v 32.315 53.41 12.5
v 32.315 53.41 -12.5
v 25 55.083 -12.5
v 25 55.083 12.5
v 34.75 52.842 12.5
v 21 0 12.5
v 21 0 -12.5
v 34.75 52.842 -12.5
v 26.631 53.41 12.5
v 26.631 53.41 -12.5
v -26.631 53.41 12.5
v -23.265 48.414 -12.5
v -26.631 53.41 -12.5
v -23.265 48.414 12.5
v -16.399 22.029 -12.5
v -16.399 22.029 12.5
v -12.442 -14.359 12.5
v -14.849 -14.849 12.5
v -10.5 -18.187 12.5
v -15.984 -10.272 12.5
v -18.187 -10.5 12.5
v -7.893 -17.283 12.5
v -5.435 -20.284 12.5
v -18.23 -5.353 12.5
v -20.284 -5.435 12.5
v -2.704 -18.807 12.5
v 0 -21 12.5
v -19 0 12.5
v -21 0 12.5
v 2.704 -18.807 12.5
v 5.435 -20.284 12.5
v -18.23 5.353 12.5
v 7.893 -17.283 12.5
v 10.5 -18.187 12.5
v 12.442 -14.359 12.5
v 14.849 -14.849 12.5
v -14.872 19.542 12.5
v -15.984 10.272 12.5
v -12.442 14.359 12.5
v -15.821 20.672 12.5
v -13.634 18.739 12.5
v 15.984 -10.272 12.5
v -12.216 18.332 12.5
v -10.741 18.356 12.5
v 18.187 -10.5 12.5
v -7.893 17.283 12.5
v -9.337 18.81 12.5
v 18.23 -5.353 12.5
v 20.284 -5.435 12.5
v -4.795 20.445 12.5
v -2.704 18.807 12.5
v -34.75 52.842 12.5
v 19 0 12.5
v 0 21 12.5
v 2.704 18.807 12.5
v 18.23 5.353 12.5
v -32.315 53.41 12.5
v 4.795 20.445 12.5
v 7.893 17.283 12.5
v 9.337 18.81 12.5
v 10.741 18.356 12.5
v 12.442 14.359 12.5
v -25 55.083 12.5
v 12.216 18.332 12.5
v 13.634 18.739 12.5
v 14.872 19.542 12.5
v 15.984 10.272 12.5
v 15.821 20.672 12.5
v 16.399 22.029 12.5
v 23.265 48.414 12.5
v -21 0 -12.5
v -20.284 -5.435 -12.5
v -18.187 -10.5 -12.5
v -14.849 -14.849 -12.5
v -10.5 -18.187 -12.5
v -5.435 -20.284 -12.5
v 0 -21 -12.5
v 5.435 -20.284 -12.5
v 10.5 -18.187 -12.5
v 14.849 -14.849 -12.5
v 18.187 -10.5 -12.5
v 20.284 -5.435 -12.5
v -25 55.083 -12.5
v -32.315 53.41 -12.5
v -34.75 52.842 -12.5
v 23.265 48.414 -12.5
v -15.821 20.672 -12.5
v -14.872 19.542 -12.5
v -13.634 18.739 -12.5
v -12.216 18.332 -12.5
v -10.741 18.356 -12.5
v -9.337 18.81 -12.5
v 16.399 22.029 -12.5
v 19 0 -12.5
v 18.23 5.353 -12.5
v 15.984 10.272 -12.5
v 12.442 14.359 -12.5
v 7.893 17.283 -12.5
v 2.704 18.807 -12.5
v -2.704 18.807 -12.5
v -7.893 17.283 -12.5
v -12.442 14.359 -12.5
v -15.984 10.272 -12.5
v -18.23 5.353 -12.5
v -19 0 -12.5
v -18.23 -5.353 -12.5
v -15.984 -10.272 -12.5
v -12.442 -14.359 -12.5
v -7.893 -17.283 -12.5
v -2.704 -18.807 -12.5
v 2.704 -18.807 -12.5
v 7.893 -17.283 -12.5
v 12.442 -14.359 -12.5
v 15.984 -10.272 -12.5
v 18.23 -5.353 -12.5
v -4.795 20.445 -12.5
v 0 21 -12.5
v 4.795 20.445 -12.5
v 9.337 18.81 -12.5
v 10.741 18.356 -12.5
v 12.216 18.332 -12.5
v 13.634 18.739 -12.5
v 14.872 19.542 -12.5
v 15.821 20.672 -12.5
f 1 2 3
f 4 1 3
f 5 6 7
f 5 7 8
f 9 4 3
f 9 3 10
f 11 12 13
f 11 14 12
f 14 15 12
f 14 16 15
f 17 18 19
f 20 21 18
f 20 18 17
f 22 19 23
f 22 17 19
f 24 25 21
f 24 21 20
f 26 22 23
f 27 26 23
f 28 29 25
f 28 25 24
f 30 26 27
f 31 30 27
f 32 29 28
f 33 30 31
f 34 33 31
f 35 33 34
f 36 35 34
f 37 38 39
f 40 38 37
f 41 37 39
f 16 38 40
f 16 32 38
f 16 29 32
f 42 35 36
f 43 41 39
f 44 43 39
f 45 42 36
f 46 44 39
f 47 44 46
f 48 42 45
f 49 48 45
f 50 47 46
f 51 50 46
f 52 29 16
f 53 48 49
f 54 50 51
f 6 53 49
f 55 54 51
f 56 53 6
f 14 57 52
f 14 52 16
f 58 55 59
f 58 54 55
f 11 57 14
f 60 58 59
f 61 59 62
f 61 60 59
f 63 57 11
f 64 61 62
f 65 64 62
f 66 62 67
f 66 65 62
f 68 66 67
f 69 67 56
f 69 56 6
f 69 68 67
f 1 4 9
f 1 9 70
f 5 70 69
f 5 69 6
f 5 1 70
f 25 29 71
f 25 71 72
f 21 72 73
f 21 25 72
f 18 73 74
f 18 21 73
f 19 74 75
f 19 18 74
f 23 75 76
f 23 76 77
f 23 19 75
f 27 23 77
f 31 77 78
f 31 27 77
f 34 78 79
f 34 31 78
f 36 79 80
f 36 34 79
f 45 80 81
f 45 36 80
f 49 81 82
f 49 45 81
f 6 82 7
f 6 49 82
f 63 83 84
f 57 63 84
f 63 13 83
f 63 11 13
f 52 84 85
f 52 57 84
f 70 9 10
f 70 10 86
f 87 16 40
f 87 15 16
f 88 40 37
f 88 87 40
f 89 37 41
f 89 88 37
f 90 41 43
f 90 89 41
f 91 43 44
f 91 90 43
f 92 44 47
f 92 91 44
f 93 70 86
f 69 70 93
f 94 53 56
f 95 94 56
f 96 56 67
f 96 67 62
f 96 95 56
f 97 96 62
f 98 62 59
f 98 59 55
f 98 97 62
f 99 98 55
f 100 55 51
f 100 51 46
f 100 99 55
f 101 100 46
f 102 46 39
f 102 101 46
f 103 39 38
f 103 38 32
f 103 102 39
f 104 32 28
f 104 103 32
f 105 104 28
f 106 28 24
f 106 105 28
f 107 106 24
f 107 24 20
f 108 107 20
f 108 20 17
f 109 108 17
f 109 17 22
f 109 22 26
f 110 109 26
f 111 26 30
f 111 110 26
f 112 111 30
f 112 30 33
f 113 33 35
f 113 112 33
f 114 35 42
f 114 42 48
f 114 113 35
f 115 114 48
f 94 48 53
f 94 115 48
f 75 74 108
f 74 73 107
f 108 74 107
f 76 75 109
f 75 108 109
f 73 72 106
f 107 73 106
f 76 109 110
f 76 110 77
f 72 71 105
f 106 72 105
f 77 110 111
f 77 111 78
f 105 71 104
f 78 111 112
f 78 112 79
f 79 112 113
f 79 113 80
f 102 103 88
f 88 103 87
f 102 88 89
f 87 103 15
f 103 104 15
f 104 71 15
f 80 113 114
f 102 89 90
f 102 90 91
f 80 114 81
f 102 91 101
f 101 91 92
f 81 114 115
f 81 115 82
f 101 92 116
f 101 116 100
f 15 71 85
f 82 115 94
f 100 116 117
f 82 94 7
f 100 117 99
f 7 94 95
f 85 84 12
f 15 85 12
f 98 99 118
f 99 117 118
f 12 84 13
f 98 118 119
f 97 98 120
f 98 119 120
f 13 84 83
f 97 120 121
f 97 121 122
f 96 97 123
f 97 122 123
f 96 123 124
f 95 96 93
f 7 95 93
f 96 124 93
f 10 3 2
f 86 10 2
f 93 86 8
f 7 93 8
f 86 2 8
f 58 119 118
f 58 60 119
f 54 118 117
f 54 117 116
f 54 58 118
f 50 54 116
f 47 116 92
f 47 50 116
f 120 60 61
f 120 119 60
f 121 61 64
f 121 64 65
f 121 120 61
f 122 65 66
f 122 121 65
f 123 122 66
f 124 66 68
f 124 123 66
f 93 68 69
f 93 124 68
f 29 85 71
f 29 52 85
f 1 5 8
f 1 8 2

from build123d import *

# Parameters (mm, degrees)
F0_R     = 19
F1_DEPTH = 12.5
F2_R     = 5


with BuildPart() as f1:
    # F0 (on Top) → F1 (new body, symmetric)
    with BuildSketch(Plane.XY):
        with BuildLine():
            Line((-34.749801, 52.841643), (-21, 0))
            ThreePointArc((-21, 0), (0, -21), (21, 0))
            Line((21, 0), (34.749801, 52.841643))
            Line((34.749801, 52.841643), (32.314748, 53.410165))
            Line((32.314748, 53.410165), (25, 55.08291))
            Line((25, 55.08291), (26.631338, 53.410165))
            Line((26.631338, 53.410165), (23.264607, 48.413649))
            Line((23.264607, 48.413649), (14.595746, 15.098484))
            ThreePointArc((14.595746, 15.098484), (0, 21), (-14.595746, 15.098484))
            Line((-14.595746, 15.098484), (-23.264607, 48.413649))
            Line((-23.264607, 48.413649), (-26.631338, 53.410165))
            Line((-26.631338, 53.410165), (-25, 55.08291))
            Line((-25, 55.08291), (-32.314748, 53.410165))
            Line((-32.314748, 53.410165), (-34.749801, 52.841643))
        make_face()
        Circle(F0_R, mode=Mode.SUBTRACT)
    extrude(amount=F1_DEPTH, both=True)

    # F2
    f2_edges = [f1.edges().sort_by_distance(p)[0] for p in [
        (-14.595746, 15.098484, 0),
        (14.595746, 15.098484, 0),
    ]]
    fillet(f2_edges, radius=F2_R)


solid = f1.part
